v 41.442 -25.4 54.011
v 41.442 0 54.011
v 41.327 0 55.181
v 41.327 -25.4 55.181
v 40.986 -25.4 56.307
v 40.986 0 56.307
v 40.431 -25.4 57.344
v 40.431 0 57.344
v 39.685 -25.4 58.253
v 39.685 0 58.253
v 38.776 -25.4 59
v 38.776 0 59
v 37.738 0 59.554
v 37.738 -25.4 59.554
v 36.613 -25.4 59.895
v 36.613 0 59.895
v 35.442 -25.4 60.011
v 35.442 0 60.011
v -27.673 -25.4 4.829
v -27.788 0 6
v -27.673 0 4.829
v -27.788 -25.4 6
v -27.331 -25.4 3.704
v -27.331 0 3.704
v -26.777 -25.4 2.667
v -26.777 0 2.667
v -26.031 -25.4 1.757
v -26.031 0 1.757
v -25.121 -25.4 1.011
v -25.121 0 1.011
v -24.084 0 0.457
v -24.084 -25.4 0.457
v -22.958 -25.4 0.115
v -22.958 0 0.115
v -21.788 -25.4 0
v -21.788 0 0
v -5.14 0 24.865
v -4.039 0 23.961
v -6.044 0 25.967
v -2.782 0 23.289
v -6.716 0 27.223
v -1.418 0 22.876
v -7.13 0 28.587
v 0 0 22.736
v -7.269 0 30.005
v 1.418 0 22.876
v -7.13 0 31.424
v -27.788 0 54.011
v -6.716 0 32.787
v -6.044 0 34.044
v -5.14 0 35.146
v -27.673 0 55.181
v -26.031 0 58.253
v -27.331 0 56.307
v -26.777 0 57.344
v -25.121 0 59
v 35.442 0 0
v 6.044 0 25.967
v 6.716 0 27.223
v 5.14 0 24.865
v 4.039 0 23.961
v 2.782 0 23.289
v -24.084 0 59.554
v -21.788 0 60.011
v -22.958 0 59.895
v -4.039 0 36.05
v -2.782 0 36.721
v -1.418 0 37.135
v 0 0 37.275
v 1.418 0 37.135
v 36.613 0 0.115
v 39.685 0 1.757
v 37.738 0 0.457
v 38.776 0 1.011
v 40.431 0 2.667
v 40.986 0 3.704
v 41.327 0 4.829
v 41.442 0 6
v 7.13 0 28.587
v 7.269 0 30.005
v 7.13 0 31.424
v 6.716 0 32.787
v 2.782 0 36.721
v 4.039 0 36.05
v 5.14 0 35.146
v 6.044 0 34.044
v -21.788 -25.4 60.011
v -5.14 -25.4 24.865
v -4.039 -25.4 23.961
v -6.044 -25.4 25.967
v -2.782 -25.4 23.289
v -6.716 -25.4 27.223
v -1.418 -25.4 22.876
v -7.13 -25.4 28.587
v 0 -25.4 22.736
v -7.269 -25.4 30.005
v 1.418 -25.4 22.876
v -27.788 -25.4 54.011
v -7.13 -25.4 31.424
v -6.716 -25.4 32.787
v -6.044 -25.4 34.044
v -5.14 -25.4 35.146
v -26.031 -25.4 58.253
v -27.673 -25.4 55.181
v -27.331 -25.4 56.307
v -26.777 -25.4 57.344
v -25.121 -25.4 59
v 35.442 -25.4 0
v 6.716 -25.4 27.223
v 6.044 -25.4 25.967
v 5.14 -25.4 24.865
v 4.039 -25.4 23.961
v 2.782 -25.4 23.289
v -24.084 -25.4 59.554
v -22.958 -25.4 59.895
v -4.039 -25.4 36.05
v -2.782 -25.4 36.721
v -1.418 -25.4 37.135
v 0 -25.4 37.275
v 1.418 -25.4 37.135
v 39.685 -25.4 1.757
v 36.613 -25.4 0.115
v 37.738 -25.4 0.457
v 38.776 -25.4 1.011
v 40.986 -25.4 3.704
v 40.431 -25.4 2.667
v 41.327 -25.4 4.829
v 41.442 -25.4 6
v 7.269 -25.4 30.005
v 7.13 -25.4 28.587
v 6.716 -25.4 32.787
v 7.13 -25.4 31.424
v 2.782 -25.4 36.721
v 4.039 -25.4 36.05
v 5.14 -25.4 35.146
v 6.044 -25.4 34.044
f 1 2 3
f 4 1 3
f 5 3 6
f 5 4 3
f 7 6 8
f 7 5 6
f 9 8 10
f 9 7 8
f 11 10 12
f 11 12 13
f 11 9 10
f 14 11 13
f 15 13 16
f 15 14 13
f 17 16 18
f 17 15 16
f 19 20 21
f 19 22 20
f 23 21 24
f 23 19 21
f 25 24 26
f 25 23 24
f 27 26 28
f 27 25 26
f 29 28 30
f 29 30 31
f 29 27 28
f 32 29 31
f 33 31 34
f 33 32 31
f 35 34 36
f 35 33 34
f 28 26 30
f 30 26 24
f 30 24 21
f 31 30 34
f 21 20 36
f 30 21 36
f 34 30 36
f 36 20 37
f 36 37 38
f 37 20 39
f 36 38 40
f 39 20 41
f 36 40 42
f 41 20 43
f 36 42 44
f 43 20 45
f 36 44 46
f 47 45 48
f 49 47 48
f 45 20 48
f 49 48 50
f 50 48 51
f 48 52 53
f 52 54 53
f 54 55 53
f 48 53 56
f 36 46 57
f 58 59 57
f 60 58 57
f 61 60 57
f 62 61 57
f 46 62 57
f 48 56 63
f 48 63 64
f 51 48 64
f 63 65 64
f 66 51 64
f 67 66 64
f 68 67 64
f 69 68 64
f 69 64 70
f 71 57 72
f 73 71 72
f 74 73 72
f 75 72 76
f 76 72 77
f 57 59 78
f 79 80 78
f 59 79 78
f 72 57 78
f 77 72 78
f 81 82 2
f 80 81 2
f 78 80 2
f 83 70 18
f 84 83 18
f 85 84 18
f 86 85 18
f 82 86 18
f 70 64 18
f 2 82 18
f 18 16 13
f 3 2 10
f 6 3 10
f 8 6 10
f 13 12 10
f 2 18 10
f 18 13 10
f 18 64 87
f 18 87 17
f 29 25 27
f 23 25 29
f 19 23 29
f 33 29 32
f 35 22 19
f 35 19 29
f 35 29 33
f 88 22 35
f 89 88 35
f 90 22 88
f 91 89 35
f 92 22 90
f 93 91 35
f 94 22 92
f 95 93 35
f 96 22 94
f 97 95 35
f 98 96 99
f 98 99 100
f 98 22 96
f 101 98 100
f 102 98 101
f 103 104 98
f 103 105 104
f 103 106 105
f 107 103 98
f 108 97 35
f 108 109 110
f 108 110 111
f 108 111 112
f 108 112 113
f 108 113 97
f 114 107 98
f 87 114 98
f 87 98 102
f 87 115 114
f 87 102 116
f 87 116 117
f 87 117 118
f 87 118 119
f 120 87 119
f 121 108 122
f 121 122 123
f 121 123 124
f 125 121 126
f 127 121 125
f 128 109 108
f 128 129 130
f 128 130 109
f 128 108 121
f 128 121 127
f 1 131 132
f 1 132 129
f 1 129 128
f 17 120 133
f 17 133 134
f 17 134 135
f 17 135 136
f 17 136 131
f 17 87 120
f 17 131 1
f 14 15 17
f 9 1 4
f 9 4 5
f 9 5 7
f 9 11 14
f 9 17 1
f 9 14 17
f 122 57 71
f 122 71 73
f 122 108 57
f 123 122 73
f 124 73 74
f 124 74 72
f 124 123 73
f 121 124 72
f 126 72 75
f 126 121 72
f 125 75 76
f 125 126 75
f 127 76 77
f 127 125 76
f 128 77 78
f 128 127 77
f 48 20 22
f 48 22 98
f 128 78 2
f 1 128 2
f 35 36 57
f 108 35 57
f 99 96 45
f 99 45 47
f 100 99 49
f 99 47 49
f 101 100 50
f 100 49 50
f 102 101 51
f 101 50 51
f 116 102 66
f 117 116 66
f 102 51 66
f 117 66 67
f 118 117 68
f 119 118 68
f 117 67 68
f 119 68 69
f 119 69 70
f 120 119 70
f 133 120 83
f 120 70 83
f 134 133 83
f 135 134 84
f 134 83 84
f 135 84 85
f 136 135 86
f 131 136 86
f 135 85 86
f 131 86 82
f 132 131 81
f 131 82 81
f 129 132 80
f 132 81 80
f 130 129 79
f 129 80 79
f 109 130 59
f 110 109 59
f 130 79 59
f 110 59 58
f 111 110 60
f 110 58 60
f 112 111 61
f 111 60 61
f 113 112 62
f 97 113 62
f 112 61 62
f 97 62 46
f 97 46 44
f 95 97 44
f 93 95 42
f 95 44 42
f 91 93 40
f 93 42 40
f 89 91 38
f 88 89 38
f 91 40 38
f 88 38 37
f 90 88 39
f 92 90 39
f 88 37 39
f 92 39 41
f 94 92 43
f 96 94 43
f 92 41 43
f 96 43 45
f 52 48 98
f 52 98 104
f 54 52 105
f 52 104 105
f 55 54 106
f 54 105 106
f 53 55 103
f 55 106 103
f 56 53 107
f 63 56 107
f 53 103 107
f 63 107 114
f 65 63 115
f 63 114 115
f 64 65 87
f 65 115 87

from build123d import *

# Parameters (mm, degrees)
F0_W     = 69.230199
F0_H     = 60.010768
F1_DEPTH = 25.4
F2_R     = 6
F3_R     = 7.269466
F4_DEPTH = 25.4


with BuildPart() as f1:
    # F0 (on Front) → F1 (new body)
    with BuildSketch(Plane.XZ):
        with Locations((6.827186, 30.005384)):
            Rectangle(F0_W, F0_H)
    extrude(amount=F1_DEPTH)

    # F2
    f2_edges = [f1.edges().sort_by_distance(p)[0] for p in [
        (41.442286, -12.7, 60.010768),
        (41.442286, -12.7, 0),
        (-27.787913, -12.7, 60.010768),
        (-27.787913, -12.7, 0),
    ]]
    fillet(f2_edges, radius=F2_R)

    # F3 (on face) → F4 (cut, through all)
    with BuildSketch(Plane(origin=(0, 0, 0), x_dir=(-1, 0, 0), z_dir=(0, 1, 0))):
        with Locations((0, 30.005384)):
            Circle(F3_R)
    extrude(amount=-F4_DEPTH, mode=Mode.SUBTRACT)


solid = f1.part
